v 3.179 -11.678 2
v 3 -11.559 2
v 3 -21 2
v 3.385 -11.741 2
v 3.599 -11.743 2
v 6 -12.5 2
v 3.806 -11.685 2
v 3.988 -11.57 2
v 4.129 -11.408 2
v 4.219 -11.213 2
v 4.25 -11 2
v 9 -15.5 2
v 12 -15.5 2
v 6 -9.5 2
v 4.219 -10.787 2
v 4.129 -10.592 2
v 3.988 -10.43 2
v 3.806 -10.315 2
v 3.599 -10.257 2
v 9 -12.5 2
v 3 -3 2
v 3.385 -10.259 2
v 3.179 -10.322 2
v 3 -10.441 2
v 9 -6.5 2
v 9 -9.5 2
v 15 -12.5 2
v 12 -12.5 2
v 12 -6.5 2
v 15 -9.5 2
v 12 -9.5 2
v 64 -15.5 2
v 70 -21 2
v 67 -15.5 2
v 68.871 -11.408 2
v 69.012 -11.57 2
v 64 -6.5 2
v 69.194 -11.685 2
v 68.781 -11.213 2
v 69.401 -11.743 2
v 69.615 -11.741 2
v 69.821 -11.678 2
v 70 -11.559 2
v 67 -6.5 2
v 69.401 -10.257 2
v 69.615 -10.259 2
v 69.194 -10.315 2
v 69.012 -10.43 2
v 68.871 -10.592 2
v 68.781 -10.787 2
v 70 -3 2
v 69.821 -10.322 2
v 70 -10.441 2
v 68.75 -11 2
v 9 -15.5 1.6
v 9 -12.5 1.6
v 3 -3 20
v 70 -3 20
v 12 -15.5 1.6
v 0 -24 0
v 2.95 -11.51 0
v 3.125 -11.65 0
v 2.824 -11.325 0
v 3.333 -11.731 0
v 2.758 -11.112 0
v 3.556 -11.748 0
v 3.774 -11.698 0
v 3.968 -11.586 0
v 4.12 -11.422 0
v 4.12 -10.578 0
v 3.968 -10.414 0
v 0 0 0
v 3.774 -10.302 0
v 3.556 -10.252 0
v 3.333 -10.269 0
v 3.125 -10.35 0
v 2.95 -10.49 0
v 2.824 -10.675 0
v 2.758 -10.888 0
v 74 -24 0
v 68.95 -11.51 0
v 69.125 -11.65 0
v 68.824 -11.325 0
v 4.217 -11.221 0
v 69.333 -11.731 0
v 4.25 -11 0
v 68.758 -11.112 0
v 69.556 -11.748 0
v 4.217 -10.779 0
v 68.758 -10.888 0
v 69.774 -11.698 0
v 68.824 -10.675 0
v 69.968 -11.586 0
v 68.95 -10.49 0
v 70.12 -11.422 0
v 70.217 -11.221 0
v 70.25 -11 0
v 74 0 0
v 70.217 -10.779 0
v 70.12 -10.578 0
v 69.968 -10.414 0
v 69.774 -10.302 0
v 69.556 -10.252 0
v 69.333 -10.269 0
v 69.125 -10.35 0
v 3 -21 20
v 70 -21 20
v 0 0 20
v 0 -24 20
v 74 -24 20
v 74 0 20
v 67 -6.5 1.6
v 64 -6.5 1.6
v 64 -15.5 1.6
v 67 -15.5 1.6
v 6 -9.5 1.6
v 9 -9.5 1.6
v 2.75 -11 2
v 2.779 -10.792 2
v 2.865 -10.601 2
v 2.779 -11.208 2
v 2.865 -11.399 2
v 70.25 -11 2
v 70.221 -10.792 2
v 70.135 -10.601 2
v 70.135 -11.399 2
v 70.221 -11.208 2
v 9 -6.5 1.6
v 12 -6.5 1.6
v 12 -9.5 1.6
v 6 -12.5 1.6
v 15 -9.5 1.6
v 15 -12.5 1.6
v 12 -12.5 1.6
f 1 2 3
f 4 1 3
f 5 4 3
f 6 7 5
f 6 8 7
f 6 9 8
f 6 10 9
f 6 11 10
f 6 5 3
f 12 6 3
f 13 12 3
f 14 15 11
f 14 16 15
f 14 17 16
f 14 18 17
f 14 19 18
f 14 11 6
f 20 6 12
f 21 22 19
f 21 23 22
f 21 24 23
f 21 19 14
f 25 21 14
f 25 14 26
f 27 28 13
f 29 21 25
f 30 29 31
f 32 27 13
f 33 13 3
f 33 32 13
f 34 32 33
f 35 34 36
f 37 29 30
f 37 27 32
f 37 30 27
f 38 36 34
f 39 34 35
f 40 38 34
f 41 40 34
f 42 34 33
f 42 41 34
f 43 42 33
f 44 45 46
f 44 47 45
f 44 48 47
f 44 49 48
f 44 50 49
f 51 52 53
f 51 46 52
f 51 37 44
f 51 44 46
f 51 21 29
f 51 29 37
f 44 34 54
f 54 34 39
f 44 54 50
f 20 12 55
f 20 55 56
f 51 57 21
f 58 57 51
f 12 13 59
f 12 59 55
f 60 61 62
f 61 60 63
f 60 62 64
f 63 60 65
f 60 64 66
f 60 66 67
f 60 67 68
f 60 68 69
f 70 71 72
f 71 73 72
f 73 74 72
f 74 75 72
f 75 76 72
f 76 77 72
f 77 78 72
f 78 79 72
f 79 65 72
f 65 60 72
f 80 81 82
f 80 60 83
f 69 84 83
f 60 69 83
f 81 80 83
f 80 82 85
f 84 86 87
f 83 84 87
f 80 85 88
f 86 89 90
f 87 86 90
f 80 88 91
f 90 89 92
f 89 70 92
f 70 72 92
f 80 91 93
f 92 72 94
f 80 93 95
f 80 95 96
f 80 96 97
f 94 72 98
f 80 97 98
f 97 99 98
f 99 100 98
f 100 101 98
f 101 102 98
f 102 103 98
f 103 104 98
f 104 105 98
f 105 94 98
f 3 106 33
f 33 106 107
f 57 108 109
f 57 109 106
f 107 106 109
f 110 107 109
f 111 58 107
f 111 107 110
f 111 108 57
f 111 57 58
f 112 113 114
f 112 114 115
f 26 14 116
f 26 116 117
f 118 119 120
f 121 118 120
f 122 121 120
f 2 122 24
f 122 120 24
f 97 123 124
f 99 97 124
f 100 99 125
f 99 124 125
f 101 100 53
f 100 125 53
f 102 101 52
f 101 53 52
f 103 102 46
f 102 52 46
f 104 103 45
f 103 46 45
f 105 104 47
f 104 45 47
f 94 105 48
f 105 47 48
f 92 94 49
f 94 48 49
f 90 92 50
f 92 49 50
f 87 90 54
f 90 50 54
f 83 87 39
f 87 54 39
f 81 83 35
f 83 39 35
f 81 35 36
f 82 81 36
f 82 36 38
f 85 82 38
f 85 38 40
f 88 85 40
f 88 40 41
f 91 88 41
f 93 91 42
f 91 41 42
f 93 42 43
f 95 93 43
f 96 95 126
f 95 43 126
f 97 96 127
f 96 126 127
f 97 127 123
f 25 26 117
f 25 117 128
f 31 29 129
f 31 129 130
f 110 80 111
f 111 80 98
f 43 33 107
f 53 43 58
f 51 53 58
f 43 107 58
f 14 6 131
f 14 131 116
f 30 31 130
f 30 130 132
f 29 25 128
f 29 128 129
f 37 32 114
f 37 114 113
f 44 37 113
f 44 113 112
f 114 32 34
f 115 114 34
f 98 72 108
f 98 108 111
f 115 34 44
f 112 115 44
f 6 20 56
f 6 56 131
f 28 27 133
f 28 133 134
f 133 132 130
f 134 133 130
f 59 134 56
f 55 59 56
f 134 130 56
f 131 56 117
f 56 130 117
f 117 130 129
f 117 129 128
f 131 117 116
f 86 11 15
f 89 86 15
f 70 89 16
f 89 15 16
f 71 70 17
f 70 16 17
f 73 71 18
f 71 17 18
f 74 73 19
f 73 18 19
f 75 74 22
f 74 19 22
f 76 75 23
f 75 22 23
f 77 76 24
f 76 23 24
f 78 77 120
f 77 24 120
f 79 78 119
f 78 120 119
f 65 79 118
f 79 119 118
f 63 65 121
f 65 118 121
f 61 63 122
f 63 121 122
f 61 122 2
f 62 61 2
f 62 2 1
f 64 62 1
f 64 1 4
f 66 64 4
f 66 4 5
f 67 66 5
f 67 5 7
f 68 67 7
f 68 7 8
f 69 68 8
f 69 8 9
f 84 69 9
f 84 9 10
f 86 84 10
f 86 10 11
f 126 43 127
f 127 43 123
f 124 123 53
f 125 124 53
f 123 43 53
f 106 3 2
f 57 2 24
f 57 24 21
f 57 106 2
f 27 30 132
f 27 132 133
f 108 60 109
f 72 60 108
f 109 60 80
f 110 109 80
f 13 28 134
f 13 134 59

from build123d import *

# Parameters (mm, degrees)
SKETCH_W        = 74
SKETCH_H        = 24
PAD_DEPTH       = 20
SKETCH001_W     = 67
SKETCH001_H     = 18
POCKET_DEPTH    = 18
SKETCH002_R     = 0.75
POCKET001_DEPTH = 2
SKETCH003_W     = 3
SKETCH003_H     = 9
POCKET002_DEPTH = 0.4


with BuildPart() as part:
    # Sketch → Pad (new body)
    with BuildSketch(Plane.XY):
        with Locations((37, -12)):
            Rectangle(SKETCH_W, SKETCH_H)
    extrude(amount=PAD_DEPTH)

    # Sketch001 (on Face6 of Pad) → Pocket (cut)
    with BuildSketch(Plane.XY.offset(20)):
        with Locations((36.5, -12)):
            Rectangle(SKETCH001_W, SKETCH001_H)
    extrude(amount=-POCKET_DEPTH, mode=Mode.SUBTRACT)

    # Sketch002 (on Face11 of Pocket) → Pocket001 (cut)
    with BuildSketch(Plane.XY.offset(2)):
        with Locations((3.5, -11)):
            Circle(SKETCH002_R)
        with Locations((69.5, -11)):
            Circle(SKETCH002_R)
    extrude(amount=-POCKET001_DEPTH, mode=Mode.SUBTRACT)

    # Sketch003 (on Face14 of Pocket001) → Pocket002 (cut)
    with BuildSketch(Plane.XY.offset(2)):
        Polygon((9, -9.5), (9, -6.5), (12, -6.5), (12, -9.5), (15, -9.5), (15, -12.5), (12, -12.5), (12, -15.5), (9, -15.5), (9, -12.5), (6, -12.5), (6, -9.5), align=None)
        with Locations((65.5, -11)):
            Rectangle(SKETCH003_W, SKETCH003_H)
    extrude(amount=-POCKET002_DEPTH, mode=Mode.SUBTRACT)


solid = part.part
